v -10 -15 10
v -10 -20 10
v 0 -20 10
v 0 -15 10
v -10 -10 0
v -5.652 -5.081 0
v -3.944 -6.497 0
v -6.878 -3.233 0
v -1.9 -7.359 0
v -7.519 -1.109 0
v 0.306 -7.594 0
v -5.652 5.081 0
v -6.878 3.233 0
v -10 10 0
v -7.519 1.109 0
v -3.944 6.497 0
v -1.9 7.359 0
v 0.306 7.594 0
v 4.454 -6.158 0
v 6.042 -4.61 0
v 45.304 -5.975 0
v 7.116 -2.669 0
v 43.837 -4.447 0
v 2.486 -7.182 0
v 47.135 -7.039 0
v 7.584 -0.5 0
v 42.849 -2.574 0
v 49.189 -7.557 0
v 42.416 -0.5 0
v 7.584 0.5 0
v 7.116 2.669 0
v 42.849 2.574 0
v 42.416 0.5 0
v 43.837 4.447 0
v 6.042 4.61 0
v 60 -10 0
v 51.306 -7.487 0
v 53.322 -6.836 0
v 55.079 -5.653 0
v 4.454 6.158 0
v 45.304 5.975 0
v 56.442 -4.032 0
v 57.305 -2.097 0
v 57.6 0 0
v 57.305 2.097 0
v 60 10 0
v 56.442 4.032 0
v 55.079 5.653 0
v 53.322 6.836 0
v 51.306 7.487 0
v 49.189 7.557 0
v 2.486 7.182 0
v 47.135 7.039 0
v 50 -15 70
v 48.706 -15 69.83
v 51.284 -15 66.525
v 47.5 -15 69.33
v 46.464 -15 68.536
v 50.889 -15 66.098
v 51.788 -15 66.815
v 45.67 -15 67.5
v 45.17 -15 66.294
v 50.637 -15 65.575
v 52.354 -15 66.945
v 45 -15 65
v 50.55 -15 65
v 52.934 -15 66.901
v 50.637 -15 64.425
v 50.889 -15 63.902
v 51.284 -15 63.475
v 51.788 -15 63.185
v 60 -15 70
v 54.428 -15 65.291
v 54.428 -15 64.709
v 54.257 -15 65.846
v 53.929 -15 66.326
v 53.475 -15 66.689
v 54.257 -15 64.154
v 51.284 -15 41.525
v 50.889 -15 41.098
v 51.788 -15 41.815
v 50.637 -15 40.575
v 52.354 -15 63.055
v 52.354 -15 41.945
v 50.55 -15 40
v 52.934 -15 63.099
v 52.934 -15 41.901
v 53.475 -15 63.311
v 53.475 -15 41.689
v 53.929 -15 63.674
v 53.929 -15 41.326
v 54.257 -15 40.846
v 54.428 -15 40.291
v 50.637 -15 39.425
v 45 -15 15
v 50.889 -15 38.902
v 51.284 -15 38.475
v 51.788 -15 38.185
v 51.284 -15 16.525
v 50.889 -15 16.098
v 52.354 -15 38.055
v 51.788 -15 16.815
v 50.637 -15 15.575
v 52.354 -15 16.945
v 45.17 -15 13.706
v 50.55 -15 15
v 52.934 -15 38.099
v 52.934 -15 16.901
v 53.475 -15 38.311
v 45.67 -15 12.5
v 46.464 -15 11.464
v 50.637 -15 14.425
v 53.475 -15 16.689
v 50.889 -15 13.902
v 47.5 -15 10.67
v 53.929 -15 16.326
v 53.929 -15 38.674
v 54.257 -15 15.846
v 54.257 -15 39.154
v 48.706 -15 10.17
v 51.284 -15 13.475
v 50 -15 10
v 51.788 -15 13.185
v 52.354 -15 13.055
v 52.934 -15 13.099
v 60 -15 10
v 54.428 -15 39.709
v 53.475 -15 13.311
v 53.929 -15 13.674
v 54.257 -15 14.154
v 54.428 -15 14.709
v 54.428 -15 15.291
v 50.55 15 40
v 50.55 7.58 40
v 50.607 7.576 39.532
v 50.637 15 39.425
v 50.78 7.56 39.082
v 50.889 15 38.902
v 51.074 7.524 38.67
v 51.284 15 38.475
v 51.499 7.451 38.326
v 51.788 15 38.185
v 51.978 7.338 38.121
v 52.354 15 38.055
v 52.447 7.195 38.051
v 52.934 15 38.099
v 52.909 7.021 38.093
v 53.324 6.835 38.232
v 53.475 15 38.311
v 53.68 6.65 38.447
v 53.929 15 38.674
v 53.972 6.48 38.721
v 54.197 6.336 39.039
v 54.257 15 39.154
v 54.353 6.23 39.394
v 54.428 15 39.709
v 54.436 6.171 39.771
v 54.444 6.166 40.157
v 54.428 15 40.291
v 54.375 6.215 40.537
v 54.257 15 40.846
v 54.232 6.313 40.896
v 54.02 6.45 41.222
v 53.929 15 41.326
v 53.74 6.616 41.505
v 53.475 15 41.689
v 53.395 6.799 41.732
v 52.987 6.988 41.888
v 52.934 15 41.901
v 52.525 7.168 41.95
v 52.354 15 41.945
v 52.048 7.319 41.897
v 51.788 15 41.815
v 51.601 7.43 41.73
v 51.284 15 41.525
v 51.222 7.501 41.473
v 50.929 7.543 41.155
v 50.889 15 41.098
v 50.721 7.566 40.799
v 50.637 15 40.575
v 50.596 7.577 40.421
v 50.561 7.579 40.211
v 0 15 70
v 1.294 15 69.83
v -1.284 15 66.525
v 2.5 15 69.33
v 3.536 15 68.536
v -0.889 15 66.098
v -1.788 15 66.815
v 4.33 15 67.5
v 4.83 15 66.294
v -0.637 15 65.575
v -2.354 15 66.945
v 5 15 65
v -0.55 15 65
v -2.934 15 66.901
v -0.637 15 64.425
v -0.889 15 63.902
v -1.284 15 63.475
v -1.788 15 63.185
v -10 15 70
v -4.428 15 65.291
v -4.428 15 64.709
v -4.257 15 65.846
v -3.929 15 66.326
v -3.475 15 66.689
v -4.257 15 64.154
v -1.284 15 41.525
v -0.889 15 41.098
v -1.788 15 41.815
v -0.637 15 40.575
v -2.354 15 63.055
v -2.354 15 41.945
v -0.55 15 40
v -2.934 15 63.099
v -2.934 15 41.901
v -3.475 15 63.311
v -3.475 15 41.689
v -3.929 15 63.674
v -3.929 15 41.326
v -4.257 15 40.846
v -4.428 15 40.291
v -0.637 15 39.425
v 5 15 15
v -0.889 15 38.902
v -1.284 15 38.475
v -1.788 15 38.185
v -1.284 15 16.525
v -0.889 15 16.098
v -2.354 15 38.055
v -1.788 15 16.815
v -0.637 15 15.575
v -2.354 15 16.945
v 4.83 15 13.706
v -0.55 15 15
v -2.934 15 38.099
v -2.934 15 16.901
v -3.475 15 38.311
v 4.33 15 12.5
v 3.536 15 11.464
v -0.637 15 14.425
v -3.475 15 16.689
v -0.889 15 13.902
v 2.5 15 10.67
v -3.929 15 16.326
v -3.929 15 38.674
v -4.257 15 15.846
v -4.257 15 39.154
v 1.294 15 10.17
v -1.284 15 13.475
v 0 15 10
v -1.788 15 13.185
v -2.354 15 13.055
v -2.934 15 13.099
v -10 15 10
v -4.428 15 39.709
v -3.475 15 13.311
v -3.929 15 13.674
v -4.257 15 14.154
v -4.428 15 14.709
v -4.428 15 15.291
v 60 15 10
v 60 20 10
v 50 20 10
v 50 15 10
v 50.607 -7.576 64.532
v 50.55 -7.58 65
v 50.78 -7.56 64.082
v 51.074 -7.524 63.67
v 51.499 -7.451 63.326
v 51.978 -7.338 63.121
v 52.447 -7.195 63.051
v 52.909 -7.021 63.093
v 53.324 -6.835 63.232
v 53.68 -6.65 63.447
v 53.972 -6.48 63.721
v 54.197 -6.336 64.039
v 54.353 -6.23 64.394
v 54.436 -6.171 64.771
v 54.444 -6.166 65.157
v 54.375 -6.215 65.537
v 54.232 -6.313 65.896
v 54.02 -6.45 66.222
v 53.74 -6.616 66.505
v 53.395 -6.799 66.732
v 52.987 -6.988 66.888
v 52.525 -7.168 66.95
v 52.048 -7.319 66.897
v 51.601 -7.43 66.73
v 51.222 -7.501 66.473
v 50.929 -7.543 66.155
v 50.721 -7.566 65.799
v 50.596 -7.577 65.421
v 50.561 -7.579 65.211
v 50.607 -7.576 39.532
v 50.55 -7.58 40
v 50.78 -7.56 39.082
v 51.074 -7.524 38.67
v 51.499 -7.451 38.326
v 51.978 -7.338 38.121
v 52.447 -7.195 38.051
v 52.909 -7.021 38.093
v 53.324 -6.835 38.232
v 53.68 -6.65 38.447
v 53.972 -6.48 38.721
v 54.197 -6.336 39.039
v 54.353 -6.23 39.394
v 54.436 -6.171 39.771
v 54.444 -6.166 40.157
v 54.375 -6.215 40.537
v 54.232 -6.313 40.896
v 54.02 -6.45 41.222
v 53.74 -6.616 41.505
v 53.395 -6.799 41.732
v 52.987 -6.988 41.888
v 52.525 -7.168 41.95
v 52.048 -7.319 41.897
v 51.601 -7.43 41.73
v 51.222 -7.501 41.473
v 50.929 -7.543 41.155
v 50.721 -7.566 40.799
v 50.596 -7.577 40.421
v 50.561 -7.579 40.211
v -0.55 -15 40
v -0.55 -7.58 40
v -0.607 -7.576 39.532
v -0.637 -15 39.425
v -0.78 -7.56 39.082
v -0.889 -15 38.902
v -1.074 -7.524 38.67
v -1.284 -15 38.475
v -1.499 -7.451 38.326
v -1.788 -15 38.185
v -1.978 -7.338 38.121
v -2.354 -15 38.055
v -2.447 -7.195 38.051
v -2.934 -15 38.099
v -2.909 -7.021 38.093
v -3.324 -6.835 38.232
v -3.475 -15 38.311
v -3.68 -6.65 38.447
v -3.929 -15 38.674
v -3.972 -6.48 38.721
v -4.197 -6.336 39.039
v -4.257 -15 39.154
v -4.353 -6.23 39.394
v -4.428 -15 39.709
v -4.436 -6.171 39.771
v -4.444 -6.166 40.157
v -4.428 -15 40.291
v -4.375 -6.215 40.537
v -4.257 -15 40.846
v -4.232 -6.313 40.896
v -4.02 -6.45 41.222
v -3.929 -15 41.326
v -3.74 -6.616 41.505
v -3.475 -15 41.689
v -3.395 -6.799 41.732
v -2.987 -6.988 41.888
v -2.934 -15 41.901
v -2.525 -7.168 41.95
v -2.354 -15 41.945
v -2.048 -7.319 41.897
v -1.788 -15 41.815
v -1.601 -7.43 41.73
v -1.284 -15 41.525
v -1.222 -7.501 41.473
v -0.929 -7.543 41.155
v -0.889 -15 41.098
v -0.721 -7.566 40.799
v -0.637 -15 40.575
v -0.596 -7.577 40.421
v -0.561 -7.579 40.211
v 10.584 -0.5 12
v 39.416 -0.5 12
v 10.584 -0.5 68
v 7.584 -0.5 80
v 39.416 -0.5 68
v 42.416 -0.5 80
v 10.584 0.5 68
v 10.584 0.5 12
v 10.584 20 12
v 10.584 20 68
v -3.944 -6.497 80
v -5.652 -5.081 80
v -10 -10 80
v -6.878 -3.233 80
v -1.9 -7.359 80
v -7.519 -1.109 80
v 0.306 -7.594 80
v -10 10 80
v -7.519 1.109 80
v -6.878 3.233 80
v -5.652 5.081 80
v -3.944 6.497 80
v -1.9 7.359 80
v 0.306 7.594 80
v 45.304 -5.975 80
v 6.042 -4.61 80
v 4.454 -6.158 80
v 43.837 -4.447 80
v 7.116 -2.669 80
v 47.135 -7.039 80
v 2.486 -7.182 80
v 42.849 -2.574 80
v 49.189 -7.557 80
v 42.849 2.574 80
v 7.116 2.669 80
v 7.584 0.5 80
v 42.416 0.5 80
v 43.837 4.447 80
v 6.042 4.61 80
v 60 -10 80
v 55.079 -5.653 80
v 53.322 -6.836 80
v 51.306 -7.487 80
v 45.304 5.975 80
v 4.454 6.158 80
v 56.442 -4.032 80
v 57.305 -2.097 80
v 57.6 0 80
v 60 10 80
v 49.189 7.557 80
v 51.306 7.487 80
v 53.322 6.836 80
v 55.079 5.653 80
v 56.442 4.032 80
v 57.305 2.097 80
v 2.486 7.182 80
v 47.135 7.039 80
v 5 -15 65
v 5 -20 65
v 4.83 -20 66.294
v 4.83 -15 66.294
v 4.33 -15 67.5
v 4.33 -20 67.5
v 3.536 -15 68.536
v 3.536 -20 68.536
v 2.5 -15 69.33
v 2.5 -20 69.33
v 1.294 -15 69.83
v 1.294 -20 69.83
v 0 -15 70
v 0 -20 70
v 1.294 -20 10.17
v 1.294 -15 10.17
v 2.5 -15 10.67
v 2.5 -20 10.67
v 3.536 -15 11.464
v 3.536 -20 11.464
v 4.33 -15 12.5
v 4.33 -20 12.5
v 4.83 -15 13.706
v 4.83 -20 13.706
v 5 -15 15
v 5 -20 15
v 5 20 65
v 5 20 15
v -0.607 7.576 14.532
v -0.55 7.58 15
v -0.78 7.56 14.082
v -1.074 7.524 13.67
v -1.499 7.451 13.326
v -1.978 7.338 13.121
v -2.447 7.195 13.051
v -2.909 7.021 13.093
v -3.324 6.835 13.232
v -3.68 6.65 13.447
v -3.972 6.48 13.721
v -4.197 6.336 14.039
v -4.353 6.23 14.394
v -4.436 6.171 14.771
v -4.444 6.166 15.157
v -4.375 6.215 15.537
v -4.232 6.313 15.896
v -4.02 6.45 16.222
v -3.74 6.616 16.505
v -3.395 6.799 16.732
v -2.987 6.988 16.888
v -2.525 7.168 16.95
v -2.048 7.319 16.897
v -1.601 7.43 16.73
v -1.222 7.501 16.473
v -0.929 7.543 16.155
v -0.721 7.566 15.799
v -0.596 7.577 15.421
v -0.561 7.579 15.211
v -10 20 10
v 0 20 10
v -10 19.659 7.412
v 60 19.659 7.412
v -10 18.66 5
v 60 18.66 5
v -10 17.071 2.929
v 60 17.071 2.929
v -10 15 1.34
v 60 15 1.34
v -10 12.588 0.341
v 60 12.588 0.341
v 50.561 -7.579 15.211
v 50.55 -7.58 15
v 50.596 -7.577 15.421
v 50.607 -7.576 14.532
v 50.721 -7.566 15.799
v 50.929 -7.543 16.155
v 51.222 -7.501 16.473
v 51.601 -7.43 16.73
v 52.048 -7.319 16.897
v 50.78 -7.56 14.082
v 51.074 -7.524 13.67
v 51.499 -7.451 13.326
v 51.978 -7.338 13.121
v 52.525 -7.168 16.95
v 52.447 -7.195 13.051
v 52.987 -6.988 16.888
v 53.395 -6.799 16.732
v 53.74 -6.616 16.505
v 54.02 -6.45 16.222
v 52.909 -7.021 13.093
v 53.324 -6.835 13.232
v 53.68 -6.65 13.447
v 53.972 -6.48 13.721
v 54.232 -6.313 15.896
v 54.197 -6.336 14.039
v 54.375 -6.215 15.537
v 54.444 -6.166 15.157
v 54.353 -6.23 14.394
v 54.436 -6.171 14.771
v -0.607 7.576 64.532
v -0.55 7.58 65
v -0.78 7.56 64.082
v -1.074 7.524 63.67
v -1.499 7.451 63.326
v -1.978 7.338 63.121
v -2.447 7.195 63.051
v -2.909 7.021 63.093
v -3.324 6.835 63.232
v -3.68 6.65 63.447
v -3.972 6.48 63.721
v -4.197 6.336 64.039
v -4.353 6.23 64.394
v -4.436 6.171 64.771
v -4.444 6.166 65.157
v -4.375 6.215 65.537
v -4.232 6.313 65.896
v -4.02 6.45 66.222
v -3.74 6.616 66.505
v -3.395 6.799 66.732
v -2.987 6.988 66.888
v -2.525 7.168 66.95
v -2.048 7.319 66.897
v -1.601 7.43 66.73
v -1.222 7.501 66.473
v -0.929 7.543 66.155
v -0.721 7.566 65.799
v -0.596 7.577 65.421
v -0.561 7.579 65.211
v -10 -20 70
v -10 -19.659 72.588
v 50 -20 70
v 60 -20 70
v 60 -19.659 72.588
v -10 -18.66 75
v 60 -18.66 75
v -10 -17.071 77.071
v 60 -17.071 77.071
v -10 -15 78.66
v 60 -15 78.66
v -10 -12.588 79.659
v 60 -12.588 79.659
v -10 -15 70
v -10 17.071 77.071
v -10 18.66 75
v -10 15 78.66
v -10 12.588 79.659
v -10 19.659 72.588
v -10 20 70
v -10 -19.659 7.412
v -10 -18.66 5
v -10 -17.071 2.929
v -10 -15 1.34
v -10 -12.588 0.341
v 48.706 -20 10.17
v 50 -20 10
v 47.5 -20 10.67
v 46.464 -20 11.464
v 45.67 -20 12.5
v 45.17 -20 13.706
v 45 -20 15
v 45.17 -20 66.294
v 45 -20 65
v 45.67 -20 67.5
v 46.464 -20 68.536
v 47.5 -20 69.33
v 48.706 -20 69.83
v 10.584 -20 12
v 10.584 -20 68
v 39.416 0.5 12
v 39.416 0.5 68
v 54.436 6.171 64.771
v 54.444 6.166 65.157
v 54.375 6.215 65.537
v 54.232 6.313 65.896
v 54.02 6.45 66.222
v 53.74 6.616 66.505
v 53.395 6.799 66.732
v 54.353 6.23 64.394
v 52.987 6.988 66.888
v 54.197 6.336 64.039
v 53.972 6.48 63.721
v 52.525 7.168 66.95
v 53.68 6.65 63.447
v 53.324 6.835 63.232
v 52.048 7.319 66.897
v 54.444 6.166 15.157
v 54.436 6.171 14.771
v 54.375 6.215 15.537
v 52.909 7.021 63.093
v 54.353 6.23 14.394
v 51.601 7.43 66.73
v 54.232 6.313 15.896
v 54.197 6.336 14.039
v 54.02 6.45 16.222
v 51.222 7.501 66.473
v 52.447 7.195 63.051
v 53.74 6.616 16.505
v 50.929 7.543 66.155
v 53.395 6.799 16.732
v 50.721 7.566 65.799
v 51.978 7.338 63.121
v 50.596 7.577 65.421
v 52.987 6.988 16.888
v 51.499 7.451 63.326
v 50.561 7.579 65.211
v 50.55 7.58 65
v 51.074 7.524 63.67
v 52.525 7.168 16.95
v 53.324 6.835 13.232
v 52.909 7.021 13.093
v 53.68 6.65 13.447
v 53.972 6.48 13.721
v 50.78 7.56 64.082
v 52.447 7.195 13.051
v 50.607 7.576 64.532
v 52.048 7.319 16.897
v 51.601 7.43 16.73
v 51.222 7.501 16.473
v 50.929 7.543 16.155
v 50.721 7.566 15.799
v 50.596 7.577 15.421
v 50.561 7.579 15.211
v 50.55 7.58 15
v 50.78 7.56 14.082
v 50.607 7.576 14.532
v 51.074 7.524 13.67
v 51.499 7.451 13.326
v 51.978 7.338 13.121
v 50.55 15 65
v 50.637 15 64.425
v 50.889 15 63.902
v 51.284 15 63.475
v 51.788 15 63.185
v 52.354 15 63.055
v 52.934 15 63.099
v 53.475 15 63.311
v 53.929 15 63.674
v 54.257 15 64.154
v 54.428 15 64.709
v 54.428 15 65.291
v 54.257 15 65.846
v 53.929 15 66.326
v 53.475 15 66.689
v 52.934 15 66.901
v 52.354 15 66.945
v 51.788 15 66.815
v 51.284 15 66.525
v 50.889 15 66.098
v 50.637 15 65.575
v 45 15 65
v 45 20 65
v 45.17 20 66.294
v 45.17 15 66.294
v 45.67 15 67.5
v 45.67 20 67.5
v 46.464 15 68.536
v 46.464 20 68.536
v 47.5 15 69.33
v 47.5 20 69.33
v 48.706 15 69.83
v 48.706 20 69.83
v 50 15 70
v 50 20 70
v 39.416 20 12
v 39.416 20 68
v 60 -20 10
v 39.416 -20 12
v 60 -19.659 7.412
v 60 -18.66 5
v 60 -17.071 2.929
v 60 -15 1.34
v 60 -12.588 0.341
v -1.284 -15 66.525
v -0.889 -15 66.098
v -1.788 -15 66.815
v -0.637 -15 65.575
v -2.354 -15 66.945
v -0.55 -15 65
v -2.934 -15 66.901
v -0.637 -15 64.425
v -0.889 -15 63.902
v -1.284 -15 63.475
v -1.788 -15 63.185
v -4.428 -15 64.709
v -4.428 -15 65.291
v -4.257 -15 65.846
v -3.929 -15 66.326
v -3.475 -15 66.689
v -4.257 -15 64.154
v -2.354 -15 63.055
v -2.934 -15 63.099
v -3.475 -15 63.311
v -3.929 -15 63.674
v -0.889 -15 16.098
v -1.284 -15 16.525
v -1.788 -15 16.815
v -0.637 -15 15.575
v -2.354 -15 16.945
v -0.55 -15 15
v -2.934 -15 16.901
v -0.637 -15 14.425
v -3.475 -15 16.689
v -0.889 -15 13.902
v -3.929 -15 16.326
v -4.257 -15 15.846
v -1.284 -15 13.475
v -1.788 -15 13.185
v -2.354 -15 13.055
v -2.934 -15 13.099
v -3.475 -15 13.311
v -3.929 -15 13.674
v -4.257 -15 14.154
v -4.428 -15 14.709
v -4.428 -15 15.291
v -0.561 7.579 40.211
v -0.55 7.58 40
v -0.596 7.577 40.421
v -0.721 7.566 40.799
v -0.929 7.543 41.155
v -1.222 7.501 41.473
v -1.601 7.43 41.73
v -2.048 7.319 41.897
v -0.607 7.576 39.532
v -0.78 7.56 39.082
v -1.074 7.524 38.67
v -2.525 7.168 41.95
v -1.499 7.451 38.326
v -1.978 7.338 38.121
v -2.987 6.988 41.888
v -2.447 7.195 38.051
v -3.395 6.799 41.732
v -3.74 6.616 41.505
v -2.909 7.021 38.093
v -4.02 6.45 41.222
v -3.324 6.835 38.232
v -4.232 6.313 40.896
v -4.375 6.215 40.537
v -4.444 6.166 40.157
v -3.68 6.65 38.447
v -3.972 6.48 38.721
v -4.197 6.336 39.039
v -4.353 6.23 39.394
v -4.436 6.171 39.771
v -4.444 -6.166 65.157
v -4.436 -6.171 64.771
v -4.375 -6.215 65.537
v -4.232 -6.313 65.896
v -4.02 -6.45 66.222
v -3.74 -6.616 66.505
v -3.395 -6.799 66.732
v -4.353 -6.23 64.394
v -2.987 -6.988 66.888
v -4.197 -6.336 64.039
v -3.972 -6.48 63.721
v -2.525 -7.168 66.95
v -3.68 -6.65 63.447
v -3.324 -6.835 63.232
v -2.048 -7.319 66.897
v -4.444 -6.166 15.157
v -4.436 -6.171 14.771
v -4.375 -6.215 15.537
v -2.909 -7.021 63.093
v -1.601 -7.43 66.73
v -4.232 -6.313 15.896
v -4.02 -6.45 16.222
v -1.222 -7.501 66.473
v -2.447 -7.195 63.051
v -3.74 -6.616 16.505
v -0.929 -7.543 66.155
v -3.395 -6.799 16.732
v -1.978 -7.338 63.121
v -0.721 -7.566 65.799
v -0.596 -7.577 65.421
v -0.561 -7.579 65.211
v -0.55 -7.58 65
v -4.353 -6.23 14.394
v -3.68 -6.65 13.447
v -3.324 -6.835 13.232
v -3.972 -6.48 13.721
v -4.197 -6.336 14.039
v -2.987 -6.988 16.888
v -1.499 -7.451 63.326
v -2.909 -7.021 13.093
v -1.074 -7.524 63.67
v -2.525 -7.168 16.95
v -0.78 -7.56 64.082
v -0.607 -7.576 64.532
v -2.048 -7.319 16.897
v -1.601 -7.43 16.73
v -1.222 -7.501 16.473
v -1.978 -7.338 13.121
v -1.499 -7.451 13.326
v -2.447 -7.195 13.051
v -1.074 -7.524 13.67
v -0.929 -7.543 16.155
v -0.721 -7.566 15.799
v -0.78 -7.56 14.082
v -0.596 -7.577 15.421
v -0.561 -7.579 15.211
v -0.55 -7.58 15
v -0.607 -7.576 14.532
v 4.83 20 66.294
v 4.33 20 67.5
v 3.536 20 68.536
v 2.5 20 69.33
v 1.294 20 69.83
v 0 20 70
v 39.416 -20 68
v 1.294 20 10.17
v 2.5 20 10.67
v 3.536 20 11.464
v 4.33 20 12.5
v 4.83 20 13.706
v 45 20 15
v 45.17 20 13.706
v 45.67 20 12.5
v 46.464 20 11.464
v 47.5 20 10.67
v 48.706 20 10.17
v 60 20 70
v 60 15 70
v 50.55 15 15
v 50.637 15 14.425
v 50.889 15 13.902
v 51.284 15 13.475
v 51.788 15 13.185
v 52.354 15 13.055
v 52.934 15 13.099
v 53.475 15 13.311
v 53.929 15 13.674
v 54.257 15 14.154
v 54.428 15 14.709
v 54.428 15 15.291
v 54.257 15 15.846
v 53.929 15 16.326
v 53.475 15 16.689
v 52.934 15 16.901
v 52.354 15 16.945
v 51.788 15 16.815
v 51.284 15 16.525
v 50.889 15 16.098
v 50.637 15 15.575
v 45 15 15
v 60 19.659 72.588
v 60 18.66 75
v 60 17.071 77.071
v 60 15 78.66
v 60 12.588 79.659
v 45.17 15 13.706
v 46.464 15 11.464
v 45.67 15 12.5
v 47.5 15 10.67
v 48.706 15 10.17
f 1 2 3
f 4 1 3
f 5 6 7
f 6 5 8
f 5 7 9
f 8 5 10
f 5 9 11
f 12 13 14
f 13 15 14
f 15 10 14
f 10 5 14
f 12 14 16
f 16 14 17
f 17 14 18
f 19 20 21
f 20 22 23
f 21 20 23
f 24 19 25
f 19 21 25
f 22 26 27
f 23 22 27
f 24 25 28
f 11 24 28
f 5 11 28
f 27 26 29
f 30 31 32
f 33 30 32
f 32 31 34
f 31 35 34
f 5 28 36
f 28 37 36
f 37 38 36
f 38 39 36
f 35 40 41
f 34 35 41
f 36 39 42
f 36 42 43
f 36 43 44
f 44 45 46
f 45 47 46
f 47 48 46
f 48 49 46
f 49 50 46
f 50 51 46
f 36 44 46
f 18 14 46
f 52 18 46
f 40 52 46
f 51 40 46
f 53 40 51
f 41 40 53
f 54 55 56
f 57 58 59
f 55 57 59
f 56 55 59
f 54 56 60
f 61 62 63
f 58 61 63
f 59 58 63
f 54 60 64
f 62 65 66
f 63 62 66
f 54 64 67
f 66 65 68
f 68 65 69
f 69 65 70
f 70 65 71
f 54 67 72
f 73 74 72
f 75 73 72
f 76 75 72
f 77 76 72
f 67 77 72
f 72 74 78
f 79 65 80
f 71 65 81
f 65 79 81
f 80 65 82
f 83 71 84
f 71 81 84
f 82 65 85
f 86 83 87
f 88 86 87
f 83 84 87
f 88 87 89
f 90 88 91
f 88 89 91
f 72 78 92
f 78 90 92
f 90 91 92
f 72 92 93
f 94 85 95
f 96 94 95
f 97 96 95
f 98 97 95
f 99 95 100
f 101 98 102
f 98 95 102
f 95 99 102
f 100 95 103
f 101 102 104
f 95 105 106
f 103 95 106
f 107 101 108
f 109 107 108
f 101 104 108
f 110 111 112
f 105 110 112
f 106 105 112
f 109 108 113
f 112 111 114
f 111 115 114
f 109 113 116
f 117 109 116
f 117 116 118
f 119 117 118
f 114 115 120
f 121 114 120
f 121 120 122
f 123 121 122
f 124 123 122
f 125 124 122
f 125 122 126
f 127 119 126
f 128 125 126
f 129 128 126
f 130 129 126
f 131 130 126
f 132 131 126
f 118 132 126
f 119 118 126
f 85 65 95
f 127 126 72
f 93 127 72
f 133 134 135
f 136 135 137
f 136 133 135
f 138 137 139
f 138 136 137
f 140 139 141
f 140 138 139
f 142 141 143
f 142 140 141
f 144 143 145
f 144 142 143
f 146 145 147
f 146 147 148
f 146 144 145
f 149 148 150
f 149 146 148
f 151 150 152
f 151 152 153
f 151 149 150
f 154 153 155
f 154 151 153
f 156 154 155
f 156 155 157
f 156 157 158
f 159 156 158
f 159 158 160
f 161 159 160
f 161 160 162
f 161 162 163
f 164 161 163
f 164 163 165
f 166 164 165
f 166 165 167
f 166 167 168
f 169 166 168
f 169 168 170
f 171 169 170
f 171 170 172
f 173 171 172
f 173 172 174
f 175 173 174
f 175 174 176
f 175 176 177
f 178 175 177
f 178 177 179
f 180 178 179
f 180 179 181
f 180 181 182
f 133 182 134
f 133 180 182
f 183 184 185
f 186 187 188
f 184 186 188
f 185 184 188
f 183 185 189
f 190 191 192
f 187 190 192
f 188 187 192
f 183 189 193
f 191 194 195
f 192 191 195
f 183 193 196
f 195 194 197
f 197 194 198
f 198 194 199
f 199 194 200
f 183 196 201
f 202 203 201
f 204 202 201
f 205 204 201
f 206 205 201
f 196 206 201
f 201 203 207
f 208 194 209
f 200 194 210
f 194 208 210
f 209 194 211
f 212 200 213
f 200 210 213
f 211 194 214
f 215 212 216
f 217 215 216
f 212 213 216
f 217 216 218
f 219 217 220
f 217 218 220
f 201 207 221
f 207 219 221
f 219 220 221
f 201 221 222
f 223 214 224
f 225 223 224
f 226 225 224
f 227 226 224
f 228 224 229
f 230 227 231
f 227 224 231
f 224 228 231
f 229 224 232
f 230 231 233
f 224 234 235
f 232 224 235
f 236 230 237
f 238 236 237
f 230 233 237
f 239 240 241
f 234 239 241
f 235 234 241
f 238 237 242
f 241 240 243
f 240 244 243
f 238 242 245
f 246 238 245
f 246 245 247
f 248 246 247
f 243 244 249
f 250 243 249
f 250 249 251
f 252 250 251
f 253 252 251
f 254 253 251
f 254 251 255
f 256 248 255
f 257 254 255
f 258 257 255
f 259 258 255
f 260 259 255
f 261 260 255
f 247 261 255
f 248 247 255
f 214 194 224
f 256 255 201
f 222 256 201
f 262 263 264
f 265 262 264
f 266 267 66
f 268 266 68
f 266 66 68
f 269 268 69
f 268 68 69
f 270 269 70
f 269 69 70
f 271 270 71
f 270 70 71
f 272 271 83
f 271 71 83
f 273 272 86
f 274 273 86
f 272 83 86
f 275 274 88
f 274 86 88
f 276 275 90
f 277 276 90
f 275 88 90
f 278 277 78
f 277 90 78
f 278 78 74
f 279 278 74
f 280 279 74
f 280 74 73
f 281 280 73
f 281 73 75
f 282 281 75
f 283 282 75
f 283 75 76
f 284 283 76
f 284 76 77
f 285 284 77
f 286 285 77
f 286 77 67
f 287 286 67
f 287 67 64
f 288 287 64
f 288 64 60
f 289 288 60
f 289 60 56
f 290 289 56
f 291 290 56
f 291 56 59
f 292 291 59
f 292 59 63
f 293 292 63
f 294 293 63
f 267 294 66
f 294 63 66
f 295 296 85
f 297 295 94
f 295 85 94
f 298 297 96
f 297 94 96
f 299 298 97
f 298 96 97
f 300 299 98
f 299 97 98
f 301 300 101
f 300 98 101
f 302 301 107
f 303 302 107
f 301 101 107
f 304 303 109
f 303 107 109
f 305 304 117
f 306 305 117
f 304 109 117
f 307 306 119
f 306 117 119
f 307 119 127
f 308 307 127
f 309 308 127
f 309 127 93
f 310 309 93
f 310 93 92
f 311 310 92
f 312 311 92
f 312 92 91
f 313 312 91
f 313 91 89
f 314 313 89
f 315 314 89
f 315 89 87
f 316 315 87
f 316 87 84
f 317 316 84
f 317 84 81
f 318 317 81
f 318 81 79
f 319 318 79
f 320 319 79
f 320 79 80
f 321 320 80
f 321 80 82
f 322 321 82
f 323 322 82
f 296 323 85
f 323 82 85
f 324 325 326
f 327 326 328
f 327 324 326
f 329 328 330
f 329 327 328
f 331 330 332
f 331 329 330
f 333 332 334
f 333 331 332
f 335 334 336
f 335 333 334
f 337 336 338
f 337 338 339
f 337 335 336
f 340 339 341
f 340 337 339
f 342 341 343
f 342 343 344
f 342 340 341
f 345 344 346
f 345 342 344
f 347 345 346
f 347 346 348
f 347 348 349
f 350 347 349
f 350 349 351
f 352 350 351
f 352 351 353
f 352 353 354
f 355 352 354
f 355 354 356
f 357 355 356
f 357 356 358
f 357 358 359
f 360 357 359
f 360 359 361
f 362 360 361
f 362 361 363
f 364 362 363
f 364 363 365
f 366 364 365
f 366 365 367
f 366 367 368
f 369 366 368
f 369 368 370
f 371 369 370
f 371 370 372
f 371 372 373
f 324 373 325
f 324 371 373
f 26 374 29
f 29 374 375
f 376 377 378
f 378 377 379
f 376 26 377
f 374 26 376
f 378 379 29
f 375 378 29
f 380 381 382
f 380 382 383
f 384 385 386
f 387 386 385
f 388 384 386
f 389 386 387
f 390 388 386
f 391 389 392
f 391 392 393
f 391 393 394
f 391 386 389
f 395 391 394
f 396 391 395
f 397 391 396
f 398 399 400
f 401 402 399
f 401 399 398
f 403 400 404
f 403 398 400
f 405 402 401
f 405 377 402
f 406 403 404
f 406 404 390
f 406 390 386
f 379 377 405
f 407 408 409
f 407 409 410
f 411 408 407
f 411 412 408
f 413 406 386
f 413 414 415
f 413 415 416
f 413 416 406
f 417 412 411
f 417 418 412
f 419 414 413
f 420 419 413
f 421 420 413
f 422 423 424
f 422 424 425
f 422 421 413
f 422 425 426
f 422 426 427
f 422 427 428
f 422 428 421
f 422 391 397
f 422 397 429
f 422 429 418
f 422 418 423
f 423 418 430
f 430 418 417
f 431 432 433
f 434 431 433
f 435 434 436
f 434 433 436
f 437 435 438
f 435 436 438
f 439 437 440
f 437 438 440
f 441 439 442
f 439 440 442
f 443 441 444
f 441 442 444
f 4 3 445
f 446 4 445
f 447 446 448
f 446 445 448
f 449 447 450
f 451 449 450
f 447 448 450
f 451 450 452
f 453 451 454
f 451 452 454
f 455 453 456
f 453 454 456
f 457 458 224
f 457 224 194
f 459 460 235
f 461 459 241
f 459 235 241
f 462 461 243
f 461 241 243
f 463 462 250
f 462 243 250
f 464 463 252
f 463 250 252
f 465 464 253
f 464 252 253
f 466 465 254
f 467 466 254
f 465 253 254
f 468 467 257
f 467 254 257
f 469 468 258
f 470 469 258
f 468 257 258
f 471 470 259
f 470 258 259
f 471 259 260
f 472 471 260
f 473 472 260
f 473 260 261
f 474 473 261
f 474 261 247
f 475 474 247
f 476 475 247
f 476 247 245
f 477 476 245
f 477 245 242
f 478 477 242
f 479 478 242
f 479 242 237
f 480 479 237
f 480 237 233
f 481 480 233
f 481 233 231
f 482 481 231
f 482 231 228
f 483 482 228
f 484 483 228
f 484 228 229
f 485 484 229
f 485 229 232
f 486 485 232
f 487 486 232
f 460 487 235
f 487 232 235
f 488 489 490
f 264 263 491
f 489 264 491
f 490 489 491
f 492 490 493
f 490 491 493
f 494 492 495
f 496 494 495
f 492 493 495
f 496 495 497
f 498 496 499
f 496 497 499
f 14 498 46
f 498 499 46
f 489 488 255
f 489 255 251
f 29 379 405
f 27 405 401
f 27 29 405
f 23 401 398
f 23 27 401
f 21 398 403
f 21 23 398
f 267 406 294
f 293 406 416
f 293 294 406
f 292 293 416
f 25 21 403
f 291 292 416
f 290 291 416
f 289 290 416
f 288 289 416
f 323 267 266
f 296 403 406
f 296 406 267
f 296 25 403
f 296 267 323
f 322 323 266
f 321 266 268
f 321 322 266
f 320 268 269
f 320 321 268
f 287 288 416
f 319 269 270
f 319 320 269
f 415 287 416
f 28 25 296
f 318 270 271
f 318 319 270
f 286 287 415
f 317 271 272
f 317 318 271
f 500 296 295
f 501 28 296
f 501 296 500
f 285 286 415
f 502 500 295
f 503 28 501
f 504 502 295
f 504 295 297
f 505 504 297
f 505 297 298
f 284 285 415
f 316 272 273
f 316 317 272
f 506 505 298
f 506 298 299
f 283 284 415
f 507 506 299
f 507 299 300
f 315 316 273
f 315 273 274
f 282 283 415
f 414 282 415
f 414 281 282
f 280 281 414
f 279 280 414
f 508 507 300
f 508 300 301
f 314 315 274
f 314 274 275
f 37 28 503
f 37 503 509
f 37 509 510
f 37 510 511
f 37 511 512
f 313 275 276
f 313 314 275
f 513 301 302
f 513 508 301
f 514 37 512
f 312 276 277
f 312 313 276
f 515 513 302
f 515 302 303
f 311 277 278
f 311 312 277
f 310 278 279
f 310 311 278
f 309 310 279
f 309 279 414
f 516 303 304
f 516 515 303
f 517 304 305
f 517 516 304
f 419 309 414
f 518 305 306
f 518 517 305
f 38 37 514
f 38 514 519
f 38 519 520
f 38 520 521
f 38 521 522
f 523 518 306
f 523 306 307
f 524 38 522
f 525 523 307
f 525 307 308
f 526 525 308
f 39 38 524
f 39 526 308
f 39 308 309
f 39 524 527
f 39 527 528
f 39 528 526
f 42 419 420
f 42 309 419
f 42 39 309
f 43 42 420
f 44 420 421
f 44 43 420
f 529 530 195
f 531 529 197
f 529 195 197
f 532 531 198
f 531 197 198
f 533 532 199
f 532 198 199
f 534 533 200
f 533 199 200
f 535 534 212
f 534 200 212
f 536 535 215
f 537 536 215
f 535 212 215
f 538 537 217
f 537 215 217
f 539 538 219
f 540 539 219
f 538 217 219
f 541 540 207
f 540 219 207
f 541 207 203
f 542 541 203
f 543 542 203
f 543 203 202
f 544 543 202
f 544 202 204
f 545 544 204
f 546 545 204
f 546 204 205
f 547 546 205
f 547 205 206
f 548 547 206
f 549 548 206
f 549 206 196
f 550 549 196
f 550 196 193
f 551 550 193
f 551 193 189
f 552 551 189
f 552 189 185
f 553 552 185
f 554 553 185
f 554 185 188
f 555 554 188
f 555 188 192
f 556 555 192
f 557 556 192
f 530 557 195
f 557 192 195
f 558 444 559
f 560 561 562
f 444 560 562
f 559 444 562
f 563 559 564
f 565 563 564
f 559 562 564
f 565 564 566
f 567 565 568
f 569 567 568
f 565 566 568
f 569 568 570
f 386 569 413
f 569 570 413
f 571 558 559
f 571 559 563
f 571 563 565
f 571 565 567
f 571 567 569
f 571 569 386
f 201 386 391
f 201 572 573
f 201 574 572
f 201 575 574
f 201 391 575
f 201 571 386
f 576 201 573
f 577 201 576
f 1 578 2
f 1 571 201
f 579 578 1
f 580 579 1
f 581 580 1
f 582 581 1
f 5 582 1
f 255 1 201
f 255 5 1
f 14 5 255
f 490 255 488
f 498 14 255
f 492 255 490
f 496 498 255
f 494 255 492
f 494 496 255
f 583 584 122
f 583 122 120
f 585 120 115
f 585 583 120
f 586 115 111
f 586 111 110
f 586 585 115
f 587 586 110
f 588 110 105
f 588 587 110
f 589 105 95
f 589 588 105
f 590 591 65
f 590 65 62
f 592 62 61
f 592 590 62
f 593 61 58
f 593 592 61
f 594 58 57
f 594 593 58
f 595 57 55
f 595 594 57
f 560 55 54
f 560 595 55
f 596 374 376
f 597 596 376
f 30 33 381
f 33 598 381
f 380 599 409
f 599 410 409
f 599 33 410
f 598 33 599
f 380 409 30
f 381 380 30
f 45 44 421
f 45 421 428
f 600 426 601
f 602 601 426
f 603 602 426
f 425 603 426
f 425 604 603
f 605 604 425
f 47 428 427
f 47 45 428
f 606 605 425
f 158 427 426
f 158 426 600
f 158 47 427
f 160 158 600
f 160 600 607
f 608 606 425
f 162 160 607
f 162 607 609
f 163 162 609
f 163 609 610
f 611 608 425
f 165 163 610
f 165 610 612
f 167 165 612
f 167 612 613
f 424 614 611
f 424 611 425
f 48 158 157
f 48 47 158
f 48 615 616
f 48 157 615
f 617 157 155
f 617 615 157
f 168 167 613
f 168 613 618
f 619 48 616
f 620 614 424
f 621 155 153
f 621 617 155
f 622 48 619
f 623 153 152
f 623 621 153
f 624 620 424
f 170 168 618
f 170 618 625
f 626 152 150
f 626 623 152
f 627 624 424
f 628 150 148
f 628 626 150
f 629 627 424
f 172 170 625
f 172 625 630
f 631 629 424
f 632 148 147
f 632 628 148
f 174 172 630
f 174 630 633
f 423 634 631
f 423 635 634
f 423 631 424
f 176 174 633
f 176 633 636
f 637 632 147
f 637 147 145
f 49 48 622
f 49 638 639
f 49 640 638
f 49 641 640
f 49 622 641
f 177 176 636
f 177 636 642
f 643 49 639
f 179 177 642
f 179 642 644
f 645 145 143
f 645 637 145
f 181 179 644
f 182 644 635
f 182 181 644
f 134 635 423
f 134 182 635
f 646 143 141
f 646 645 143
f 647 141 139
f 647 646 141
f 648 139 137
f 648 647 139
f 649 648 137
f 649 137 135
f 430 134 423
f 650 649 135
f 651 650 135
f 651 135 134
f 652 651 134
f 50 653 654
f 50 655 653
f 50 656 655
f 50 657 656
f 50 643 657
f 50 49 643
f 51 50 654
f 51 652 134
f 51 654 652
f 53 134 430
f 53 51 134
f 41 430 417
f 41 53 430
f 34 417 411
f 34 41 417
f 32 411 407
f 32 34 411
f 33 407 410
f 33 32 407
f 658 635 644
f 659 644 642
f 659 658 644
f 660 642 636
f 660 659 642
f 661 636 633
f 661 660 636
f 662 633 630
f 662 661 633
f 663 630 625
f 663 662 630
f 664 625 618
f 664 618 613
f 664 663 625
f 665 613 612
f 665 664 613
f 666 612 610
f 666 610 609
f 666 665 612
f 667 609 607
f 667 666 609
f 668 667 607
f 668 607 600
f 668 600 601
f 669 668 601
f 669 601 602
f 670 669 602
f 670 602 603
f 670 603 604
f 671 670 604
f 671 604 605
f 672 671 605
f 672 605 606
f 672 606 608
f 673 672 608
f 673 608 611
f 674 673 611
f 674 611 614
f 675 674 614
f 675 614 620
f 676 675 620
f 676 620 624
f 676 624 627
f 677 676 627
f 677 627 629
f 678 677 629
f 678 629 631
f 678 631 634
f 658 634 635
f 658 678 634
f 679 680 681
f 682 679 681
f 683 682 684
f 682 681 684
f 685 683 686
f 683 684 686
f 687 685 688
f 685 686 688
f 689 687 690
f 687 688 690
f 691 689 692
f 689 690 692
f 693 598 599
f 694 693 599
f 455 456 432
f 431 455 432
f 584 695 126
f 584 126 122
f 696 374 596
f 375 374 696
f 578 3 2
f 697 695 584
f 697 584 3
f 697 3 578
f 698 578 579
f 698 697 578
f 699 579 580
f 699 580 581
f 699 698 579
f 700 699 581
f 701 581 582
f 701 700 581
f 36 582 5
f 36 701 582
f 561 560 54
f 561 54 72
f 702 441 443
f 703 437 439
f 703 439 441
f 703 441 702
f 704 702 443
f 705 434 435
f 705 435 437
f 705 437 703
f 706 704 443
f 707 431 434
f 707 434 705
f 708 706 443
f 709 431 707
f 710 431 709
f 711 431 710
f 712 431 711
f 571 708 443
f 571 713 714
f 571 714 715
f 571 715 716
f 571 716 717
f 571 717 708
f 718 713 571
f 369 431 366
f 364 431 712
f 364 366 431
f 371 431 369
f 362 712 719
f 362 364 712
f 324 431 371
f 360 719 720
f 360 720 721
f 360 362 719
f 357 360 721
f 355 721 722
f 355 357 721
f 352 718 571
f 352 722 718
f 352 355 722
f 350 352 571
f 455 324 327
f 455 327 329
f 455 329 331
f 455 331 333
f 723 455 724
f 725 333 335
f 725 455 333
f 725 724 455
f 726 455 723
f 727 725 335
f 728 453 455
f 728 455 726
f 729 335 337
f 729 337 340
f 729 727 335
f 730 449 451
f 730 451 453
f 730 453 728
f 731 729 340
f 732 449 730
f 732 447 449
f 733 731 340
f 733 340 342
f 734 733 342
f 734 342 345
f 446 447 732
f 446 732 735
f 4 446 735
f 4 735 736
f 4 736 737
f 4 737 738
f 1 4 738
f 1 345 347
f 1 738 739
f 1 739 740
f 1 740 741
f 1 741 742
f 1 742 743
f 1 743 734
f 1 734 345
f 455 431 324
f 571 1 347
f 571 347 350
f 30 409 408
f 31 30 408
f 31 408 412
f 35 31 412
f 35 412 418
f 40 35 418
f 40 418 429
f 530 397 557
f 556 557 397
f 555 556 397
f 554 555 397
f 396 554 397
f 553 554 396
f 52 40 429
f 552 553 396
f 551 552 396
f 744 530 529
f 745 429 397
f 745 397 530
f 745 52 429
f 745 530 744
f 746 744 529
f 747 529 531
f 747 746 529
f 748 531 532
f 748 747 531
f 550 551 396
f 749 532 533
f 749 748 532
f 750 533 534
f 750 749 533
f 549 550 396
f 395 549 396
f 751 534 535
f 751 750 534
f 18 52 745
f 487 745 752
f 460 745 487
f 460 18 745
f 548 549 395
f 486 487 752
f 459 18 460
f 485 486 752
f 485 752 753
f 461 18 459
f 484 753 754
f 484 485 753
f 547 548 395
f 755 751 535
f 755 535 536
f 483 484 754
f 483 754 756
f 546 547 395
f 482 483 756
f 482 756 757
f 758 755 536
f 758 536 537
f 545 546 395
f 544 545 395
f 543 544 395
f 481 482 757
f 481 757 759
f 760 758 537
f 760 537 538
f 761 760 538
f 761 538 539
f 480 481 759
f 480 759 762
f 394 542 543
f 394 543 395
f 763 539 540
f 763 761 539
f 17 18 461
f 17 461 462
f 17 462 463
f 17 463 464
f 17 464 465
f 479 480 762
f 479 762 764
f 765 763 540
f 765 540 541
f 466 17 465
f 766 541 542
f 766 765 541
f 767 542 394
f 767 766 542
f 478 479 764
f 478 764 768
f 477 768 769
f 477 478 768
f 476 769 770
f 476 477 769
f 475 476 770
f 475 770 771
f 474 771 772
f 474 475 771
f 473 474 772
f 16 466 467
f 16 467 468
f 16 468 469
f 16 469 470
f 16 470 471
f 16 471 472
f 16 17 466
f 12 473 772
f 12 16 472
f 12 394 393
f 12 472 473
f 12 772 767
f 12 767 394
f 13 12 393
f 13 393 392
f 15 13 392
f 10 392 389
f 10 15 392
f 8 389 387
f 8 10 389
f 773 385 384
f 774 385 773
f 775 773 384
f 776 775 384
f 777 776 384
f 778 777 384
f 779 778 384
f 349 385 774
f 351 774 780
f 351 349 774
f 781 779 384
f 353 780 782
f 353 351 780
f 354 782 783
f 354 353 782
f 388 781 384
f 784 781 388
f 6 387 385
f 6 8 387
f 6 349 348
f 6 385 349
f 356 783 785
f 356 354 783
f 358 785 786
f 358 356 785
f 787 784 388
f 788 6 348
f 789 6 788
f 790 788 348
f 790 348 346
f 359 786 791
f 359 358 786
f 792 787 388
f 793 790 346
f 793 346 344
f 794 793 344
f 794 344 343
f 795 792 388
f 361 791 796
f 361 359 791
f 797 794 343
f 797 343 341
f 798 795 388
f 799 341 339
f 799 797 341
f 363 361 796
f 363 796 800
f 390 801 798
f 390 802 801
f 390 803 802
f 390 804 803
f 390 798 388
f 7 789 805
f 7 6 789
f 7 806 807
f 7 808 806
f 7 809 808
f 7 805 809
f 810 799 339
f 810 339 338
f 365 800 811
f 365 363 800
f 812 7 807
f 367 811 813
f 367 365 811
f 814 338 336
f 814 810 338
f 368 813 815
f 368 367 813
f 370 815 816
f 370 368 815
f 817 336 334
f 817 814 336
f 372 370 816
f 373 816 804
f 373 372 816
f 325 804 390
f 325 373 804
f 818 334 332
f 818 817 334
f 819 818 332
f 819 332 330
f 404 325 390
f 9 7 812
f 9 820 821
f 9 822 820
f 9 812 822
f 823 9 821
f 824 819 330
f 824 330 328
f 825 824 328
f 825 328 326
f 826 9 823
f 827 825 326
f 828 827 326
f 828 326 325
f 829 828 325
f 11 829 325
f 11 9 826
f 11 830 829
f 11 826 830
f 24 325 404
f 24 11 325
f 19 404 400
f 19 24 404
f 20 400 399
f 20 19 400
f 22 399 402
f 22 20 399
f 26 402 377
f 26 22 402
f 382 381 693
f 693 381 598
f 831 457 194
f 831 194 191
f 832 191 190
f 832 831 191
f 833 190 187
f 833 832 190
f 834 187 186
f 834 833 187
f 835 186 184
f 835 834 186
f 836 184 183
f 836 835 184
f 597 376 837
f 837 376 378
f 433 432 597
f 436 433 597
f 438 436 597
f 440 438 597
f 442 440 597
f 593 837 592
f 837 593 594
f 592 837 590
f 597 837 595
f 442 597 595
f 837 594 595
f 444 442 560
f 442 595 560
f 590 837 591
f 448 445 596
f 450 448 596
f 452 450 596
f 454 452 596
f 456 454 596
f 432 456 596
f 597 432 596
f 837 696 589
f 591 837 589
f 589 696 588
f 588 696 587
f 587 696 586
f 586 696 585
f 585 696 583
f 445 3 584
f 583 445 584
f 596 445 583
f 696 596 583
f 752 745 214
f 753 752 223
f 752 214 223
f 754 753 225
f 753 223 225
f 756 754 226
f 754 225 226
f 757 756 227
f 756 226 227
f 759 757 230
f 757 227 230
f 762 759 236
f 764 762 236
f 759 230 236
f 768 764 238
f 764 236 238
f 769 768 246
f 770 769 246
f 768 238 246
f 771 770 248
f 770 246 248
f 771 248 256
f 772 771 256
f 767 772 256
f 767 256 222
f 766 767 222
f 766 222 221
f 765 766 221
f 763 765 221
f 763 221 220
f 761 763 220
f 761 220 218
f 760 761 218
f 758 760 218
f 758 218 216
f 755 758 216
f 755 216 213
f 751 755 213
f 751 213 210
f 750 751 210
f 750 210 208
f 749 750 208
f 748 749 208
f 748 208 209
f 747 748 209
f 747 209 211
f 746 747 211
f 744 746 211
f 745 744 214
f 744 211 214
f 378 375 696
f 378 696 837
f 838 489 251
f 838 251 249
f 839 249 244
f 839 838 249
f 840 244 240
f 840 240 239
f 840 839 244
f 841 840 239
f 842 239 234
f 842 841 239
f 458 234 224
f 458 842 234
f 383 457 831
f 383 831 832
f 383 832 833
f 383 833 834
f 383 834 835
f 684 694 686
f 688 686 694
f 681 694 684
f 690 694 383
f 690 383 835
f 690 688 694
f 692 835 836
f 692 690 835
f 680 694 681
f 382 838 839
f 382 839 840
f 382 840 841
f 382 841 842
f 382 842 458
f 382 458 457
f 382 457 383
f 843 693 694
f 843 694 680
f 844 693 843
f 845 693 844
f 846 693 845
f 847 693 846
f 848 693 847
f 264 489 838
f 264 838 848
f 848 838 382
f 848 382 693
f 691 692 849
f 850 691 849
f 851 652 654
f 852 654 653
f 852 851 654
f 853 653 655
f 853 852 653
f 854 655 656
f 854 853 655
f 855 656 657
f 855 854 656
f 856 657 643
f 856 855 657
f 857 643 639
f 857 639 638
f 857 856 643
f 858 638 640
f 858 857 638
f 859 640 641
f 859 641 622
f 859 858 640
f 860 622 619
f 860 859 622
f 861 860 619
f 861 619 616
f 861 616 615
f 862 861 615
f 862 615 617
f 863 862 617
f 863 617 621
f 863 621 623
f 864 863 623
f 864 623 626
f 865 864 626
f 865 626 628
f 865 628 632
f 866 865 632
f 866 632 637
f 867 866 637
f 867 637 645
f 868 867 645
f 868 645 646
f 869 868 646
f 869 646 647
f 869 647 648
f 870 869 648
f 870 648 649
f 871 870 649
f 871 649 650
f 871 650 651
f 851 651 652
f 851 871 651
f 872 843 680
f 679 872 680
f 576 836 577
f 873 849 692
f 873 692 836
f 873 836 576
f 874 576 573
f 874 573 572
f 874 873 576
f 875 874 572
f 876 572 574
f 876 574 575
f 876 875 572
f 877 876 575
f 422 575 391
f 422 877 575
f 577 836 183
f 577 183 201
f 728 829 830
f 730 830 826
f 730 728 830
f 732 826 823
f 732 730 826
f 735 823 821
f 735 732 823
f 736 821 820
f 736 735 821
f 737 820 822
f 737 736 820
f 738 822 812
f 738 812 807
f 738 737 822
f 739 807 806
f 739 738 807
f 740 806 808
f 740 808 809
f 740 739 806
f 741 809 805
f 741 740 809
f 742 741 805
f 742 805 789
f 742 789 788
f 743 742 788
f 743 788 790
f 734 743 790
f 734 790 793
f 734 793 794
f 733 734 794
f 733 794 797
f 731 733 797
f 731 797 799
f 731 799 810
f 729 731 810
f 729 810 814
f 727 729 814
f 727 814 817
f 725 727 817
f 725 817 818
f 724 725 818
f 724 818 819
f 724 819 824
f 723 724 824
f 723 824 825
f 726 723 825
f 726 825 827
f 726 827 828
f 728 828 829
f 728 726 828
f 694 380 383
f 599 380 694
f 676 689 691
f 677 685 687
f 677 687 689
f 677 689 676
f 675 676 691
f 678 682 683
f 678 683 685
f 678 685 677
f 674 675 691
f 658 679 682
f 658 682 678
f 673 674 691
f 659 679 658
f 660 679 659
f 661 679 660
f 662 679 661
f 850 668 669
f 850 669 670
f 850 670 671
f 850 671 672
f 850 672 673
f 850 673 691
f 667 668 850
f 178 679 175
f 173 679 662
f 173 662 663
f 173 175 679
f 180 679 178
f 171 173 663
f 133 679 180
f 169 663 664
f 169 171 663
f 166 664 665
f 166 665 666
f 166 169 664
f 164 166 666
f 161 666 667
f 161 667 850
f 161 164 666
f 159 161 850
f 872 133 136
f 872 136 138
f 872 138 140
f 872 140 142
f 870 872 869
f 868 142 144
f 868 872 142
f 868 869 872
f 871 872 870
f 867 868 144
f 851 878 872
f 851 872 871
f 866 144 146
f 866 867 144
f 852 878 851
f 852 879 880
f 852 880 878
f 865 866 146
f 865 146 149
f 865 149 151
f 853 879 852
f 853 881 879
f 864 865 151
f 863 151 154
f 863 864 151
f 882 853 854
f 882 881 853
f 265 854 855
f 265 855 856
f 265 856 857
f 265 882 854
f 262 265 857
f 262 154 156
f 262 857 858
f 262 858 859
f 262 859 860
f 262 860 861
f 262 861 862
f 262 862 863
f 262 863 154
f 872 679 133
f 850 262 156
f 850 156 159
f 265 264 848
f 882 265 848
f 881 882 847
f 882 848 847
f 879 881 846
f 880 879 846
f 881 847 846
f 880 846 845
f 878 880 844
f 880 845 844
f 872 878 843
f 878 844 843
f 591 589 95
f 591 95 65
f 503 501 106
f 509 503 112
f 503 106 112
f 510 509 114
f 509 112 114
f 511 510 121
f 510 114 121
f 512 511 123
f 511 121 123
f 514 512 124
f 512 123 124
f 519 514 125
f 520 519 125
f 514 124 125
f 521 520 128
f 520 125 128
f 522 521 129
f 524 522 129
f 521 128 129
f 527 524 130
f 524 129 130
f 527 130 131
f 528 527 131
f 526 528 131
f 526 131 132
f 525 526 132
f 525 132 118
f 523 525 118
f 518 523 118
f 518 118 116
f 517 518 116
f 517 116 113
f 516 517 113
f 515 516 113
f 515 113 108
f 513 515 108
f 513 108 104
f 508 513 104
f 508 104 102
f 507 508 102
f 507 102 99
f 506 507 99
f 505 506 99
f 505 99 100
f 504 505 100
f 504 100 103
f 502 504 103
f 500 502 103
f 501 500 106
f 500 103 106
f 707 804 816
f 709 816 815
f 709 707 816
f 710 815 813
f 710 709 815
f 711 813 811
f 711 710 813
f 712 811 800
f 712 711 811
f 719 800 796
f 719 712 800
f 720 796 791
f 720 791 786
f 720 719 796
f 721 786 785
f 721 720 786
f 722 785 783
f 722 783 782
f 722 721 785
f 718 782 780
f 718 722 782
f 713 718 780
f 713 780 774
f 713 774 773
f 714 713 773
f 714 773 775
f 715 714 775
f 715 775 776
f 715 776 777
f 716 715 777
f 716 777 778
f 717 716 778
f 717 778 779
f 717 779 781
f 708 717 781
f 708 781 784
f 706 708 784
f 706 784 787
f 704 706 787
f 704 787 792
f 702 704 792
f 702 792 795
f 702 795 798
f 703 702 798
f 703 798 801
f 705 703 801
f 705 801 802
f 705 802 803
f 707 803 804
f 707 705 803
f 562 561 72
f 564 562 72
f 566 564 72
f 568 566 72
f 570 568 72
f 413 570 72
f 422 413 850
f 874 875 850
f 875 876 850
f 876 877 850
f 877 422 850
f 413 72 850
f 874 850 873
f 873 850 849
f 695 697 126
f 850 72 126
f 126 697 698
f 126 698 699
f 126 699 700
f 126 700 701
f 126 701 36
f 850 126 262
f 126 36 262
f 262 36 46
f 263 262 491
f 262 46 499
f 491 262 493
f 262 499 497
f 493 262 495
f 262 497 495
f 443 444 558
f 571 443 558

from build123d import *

# Parameters (mm, degrees)
SKETCH1_W                    = 70
SKETCH1_H                    = 40
SKETCH1_R                    = 7.6
BOSS_EXTRUDE1_DEPTH          = 80
FILLET1_R                    = 10
CUT_EXTRUDE_THIN1_DEPTH      = 1
CUT_EXTRUDE_THIN1_DEPTH_BACK = 95
SKETCH24_W                   = 28.832930408
SKETCH24_H                   = 56
CUT_EXTRUDE15_DEPTH          = 39
CUT_EXTRUDE15_DEPTH_BACK     = 40
CUT_EXTRUDE17_DEPTH          = 5
SKETCH28_R                   = 1.95
CUT_EXTRUDE18_DEPTH          = 20
MIRROR2_COPY_1_DEPTH         = 5
MIRROR2_COPY_2_SKETCH_R      = 1.95
MIRROR2_COPY_2_DEPTH         = 20


with BuildPart() as part:
    # Sketch1 → Boss-Extrude1 (new body)
    with BuildSketch(Plane.XY):
        with Locations((25, 0)):
            Rectangle(SKETCH1_W, SKETCH1_H)
        Circle(SKETCH1_R, mode=Mode.SUBTRACT)
        with Locations((50, 0)):
            Circle(SKETCH1_R, mode=Mode.SUBTRACT)
    extrude(amount=BOSS_EXTRUDE1_DEPTH)

    # Fillet1
    fillet1_edges = [part.edges().sort_by_distance(p)[0] for p in [
        (25, -20, 80),
        (25, -20, 0),
        (25, 20, 0),
        (25, 20, 80),
    ]]
    fillet(fillet1_edges, radius=FILLET1_R)

    # Sketch12 → Cut-Extrude-Thin1 (cut, two sides)
    with BuildSketch(Plane.XY.offset(80)) as cut_extrude_thin1_sk:
        Polygon((3.119310539, -0.5), (7.6, -0.5), (42.4, -0.5), (46.98201893, -0.5), (46.98201893, 0.5), (42.4, 0.5), (7.6, 0.5), (3.119310539, 0.5), align=None)
    extrude(amount=CUT_EXTRUDE_THIN1_DEPTH, mode=Mode.SUBTRACT)
    extrude(cut_extrude_thin1_sk.sketch, amount=-CUT_EXTRUDE_THIN1_DEPTH_BACK, mode=Mode.SUBTRACT)

    # Sketch24 → Cut-Extrude15 (cut, two sides)
    with BuildSketch(Plane.XZ.offset(-0.5)) as cut_extrude15_sk:
        with Locations((25, 40)):
            Rectangle(SKETCH24_W, SKETCH24_H)
    extrude(amount=CUT_EXTRUDE15_DEPTH, mode=Mode.SUBTRACT)
    extrude(cut_extrude15_sk.sketch, amount=-CUT_EXTRUDE15_DEPTH_BACK, mode=Mode.SUBTRACT)

    # Sketch27 → Cut-Extrude17 (cut)
    with BuildSketch(Plane(origin=(0, 20, 0), x_dir=(1, 0, 0), z_dir=(0, 1, 0))):
        with BuildLine():
            Line((-10, -10), (0, -10))
            ThreePointArc((0, -10), (3.535533906, -11.464466094), (5, -15))
            Line((5, -15), (5, -65))
            ThreePointArc((5, -65), (3.535533906, -68.535533906), (0, -70))
            Line((0, -70), (-10, -70))
            Line((-10, -70), (-10, -10))
        make_face()
    cut_extrude17 = extrude(amount=-CUT_EXTRUDE17_DEPTH, mode=Mode.SUBTRACT)

    # Sketch28 → Cut-Extrude18 (cut)
    with BuildSketch(Plane(origin=(0, 15, 0), x_dir=(1, 0, 0), z_dir=(0, 1, 0))):
        with Locations((-2.5, -15)):
            Circle(SKETCH28_R)
        with Locations((-2.5, -40)):
            Circle(SKETCH28_R)
        with Locations((-2.5, -65)):
            Circle(SKETCH28_R)
    cut_extrude18 = extrude(amount=-CUT_EXTRUDE18_DEPTH, mode=Mode.SUBTRACT)

    # Mirror1: Cut-Extrude17, Cut-Extrude18 across plane
    add(cut_extrude17.mirror(Plane.ZY.offset(-25)), mode=Mode.SUBTRACT)
    add(cut_extrude18.mirror(Plane.ZY.offset(-25)), mode=Mode.SUBTRACT)

    # Mirror2: Cut-Extrude17, Cut-Extrude18 across plane
    add(cut_extrude17.mirror(Plane.ZX), mode=Mode.SUBTRACT)
    add(cut_extrude18.mirror(Plane.ZX), mode=Mode.SUBTRACT)

    # Mirror2 copy 1 sketch → Mirror2 copy 1 (cut)
    with BuildSketch(Plane(origin=(50, -20, 0), x_dir=(-1, 0, 0), z_dir=(0, -1, 0))):
        with BuildLine():
            Line((-10, -10), (0, -10))
            ThreePointArc((0, -10), (3.535533906, -11.464466094), (5, -15))
            Line((5, -15), (5, -65))
            ThreePointArc((5, -65), (3.535533906, -68.535533906), (0, -70))
            Line((0, -70), (-10, -70))
            Line((-10, -70), (-10, -10))
        make_face()
    extrude(amount=-MIRROR2_COPY_1_DEPTH, mode=Mode.SUBTRACT)

    # Mirror2 copy 2 sketch → Mirror2 copy 2 (cut)
    with BuildSketch(Plane(origin=(50, -15, 0), x_dir=(-1, 0, 0), z_dir=(0, -1, 0))):
        with Locations((-2.5, -15)):
            Circle(MIRROR2_COPY_2_SKETCH_R)
        with Locations((-2.5, -40)):
            Circle(MIRROR2_COPY_2_SKETCH_R)
        with Locations((-2.5, -65)):
            Circle(MIRROR2_COPY_2_SKETCH_R)
    extrude(amount=-MIRROR2_COPY_2_DEPTH, mode=Mode.SUBTRACT)


solid = part.part
